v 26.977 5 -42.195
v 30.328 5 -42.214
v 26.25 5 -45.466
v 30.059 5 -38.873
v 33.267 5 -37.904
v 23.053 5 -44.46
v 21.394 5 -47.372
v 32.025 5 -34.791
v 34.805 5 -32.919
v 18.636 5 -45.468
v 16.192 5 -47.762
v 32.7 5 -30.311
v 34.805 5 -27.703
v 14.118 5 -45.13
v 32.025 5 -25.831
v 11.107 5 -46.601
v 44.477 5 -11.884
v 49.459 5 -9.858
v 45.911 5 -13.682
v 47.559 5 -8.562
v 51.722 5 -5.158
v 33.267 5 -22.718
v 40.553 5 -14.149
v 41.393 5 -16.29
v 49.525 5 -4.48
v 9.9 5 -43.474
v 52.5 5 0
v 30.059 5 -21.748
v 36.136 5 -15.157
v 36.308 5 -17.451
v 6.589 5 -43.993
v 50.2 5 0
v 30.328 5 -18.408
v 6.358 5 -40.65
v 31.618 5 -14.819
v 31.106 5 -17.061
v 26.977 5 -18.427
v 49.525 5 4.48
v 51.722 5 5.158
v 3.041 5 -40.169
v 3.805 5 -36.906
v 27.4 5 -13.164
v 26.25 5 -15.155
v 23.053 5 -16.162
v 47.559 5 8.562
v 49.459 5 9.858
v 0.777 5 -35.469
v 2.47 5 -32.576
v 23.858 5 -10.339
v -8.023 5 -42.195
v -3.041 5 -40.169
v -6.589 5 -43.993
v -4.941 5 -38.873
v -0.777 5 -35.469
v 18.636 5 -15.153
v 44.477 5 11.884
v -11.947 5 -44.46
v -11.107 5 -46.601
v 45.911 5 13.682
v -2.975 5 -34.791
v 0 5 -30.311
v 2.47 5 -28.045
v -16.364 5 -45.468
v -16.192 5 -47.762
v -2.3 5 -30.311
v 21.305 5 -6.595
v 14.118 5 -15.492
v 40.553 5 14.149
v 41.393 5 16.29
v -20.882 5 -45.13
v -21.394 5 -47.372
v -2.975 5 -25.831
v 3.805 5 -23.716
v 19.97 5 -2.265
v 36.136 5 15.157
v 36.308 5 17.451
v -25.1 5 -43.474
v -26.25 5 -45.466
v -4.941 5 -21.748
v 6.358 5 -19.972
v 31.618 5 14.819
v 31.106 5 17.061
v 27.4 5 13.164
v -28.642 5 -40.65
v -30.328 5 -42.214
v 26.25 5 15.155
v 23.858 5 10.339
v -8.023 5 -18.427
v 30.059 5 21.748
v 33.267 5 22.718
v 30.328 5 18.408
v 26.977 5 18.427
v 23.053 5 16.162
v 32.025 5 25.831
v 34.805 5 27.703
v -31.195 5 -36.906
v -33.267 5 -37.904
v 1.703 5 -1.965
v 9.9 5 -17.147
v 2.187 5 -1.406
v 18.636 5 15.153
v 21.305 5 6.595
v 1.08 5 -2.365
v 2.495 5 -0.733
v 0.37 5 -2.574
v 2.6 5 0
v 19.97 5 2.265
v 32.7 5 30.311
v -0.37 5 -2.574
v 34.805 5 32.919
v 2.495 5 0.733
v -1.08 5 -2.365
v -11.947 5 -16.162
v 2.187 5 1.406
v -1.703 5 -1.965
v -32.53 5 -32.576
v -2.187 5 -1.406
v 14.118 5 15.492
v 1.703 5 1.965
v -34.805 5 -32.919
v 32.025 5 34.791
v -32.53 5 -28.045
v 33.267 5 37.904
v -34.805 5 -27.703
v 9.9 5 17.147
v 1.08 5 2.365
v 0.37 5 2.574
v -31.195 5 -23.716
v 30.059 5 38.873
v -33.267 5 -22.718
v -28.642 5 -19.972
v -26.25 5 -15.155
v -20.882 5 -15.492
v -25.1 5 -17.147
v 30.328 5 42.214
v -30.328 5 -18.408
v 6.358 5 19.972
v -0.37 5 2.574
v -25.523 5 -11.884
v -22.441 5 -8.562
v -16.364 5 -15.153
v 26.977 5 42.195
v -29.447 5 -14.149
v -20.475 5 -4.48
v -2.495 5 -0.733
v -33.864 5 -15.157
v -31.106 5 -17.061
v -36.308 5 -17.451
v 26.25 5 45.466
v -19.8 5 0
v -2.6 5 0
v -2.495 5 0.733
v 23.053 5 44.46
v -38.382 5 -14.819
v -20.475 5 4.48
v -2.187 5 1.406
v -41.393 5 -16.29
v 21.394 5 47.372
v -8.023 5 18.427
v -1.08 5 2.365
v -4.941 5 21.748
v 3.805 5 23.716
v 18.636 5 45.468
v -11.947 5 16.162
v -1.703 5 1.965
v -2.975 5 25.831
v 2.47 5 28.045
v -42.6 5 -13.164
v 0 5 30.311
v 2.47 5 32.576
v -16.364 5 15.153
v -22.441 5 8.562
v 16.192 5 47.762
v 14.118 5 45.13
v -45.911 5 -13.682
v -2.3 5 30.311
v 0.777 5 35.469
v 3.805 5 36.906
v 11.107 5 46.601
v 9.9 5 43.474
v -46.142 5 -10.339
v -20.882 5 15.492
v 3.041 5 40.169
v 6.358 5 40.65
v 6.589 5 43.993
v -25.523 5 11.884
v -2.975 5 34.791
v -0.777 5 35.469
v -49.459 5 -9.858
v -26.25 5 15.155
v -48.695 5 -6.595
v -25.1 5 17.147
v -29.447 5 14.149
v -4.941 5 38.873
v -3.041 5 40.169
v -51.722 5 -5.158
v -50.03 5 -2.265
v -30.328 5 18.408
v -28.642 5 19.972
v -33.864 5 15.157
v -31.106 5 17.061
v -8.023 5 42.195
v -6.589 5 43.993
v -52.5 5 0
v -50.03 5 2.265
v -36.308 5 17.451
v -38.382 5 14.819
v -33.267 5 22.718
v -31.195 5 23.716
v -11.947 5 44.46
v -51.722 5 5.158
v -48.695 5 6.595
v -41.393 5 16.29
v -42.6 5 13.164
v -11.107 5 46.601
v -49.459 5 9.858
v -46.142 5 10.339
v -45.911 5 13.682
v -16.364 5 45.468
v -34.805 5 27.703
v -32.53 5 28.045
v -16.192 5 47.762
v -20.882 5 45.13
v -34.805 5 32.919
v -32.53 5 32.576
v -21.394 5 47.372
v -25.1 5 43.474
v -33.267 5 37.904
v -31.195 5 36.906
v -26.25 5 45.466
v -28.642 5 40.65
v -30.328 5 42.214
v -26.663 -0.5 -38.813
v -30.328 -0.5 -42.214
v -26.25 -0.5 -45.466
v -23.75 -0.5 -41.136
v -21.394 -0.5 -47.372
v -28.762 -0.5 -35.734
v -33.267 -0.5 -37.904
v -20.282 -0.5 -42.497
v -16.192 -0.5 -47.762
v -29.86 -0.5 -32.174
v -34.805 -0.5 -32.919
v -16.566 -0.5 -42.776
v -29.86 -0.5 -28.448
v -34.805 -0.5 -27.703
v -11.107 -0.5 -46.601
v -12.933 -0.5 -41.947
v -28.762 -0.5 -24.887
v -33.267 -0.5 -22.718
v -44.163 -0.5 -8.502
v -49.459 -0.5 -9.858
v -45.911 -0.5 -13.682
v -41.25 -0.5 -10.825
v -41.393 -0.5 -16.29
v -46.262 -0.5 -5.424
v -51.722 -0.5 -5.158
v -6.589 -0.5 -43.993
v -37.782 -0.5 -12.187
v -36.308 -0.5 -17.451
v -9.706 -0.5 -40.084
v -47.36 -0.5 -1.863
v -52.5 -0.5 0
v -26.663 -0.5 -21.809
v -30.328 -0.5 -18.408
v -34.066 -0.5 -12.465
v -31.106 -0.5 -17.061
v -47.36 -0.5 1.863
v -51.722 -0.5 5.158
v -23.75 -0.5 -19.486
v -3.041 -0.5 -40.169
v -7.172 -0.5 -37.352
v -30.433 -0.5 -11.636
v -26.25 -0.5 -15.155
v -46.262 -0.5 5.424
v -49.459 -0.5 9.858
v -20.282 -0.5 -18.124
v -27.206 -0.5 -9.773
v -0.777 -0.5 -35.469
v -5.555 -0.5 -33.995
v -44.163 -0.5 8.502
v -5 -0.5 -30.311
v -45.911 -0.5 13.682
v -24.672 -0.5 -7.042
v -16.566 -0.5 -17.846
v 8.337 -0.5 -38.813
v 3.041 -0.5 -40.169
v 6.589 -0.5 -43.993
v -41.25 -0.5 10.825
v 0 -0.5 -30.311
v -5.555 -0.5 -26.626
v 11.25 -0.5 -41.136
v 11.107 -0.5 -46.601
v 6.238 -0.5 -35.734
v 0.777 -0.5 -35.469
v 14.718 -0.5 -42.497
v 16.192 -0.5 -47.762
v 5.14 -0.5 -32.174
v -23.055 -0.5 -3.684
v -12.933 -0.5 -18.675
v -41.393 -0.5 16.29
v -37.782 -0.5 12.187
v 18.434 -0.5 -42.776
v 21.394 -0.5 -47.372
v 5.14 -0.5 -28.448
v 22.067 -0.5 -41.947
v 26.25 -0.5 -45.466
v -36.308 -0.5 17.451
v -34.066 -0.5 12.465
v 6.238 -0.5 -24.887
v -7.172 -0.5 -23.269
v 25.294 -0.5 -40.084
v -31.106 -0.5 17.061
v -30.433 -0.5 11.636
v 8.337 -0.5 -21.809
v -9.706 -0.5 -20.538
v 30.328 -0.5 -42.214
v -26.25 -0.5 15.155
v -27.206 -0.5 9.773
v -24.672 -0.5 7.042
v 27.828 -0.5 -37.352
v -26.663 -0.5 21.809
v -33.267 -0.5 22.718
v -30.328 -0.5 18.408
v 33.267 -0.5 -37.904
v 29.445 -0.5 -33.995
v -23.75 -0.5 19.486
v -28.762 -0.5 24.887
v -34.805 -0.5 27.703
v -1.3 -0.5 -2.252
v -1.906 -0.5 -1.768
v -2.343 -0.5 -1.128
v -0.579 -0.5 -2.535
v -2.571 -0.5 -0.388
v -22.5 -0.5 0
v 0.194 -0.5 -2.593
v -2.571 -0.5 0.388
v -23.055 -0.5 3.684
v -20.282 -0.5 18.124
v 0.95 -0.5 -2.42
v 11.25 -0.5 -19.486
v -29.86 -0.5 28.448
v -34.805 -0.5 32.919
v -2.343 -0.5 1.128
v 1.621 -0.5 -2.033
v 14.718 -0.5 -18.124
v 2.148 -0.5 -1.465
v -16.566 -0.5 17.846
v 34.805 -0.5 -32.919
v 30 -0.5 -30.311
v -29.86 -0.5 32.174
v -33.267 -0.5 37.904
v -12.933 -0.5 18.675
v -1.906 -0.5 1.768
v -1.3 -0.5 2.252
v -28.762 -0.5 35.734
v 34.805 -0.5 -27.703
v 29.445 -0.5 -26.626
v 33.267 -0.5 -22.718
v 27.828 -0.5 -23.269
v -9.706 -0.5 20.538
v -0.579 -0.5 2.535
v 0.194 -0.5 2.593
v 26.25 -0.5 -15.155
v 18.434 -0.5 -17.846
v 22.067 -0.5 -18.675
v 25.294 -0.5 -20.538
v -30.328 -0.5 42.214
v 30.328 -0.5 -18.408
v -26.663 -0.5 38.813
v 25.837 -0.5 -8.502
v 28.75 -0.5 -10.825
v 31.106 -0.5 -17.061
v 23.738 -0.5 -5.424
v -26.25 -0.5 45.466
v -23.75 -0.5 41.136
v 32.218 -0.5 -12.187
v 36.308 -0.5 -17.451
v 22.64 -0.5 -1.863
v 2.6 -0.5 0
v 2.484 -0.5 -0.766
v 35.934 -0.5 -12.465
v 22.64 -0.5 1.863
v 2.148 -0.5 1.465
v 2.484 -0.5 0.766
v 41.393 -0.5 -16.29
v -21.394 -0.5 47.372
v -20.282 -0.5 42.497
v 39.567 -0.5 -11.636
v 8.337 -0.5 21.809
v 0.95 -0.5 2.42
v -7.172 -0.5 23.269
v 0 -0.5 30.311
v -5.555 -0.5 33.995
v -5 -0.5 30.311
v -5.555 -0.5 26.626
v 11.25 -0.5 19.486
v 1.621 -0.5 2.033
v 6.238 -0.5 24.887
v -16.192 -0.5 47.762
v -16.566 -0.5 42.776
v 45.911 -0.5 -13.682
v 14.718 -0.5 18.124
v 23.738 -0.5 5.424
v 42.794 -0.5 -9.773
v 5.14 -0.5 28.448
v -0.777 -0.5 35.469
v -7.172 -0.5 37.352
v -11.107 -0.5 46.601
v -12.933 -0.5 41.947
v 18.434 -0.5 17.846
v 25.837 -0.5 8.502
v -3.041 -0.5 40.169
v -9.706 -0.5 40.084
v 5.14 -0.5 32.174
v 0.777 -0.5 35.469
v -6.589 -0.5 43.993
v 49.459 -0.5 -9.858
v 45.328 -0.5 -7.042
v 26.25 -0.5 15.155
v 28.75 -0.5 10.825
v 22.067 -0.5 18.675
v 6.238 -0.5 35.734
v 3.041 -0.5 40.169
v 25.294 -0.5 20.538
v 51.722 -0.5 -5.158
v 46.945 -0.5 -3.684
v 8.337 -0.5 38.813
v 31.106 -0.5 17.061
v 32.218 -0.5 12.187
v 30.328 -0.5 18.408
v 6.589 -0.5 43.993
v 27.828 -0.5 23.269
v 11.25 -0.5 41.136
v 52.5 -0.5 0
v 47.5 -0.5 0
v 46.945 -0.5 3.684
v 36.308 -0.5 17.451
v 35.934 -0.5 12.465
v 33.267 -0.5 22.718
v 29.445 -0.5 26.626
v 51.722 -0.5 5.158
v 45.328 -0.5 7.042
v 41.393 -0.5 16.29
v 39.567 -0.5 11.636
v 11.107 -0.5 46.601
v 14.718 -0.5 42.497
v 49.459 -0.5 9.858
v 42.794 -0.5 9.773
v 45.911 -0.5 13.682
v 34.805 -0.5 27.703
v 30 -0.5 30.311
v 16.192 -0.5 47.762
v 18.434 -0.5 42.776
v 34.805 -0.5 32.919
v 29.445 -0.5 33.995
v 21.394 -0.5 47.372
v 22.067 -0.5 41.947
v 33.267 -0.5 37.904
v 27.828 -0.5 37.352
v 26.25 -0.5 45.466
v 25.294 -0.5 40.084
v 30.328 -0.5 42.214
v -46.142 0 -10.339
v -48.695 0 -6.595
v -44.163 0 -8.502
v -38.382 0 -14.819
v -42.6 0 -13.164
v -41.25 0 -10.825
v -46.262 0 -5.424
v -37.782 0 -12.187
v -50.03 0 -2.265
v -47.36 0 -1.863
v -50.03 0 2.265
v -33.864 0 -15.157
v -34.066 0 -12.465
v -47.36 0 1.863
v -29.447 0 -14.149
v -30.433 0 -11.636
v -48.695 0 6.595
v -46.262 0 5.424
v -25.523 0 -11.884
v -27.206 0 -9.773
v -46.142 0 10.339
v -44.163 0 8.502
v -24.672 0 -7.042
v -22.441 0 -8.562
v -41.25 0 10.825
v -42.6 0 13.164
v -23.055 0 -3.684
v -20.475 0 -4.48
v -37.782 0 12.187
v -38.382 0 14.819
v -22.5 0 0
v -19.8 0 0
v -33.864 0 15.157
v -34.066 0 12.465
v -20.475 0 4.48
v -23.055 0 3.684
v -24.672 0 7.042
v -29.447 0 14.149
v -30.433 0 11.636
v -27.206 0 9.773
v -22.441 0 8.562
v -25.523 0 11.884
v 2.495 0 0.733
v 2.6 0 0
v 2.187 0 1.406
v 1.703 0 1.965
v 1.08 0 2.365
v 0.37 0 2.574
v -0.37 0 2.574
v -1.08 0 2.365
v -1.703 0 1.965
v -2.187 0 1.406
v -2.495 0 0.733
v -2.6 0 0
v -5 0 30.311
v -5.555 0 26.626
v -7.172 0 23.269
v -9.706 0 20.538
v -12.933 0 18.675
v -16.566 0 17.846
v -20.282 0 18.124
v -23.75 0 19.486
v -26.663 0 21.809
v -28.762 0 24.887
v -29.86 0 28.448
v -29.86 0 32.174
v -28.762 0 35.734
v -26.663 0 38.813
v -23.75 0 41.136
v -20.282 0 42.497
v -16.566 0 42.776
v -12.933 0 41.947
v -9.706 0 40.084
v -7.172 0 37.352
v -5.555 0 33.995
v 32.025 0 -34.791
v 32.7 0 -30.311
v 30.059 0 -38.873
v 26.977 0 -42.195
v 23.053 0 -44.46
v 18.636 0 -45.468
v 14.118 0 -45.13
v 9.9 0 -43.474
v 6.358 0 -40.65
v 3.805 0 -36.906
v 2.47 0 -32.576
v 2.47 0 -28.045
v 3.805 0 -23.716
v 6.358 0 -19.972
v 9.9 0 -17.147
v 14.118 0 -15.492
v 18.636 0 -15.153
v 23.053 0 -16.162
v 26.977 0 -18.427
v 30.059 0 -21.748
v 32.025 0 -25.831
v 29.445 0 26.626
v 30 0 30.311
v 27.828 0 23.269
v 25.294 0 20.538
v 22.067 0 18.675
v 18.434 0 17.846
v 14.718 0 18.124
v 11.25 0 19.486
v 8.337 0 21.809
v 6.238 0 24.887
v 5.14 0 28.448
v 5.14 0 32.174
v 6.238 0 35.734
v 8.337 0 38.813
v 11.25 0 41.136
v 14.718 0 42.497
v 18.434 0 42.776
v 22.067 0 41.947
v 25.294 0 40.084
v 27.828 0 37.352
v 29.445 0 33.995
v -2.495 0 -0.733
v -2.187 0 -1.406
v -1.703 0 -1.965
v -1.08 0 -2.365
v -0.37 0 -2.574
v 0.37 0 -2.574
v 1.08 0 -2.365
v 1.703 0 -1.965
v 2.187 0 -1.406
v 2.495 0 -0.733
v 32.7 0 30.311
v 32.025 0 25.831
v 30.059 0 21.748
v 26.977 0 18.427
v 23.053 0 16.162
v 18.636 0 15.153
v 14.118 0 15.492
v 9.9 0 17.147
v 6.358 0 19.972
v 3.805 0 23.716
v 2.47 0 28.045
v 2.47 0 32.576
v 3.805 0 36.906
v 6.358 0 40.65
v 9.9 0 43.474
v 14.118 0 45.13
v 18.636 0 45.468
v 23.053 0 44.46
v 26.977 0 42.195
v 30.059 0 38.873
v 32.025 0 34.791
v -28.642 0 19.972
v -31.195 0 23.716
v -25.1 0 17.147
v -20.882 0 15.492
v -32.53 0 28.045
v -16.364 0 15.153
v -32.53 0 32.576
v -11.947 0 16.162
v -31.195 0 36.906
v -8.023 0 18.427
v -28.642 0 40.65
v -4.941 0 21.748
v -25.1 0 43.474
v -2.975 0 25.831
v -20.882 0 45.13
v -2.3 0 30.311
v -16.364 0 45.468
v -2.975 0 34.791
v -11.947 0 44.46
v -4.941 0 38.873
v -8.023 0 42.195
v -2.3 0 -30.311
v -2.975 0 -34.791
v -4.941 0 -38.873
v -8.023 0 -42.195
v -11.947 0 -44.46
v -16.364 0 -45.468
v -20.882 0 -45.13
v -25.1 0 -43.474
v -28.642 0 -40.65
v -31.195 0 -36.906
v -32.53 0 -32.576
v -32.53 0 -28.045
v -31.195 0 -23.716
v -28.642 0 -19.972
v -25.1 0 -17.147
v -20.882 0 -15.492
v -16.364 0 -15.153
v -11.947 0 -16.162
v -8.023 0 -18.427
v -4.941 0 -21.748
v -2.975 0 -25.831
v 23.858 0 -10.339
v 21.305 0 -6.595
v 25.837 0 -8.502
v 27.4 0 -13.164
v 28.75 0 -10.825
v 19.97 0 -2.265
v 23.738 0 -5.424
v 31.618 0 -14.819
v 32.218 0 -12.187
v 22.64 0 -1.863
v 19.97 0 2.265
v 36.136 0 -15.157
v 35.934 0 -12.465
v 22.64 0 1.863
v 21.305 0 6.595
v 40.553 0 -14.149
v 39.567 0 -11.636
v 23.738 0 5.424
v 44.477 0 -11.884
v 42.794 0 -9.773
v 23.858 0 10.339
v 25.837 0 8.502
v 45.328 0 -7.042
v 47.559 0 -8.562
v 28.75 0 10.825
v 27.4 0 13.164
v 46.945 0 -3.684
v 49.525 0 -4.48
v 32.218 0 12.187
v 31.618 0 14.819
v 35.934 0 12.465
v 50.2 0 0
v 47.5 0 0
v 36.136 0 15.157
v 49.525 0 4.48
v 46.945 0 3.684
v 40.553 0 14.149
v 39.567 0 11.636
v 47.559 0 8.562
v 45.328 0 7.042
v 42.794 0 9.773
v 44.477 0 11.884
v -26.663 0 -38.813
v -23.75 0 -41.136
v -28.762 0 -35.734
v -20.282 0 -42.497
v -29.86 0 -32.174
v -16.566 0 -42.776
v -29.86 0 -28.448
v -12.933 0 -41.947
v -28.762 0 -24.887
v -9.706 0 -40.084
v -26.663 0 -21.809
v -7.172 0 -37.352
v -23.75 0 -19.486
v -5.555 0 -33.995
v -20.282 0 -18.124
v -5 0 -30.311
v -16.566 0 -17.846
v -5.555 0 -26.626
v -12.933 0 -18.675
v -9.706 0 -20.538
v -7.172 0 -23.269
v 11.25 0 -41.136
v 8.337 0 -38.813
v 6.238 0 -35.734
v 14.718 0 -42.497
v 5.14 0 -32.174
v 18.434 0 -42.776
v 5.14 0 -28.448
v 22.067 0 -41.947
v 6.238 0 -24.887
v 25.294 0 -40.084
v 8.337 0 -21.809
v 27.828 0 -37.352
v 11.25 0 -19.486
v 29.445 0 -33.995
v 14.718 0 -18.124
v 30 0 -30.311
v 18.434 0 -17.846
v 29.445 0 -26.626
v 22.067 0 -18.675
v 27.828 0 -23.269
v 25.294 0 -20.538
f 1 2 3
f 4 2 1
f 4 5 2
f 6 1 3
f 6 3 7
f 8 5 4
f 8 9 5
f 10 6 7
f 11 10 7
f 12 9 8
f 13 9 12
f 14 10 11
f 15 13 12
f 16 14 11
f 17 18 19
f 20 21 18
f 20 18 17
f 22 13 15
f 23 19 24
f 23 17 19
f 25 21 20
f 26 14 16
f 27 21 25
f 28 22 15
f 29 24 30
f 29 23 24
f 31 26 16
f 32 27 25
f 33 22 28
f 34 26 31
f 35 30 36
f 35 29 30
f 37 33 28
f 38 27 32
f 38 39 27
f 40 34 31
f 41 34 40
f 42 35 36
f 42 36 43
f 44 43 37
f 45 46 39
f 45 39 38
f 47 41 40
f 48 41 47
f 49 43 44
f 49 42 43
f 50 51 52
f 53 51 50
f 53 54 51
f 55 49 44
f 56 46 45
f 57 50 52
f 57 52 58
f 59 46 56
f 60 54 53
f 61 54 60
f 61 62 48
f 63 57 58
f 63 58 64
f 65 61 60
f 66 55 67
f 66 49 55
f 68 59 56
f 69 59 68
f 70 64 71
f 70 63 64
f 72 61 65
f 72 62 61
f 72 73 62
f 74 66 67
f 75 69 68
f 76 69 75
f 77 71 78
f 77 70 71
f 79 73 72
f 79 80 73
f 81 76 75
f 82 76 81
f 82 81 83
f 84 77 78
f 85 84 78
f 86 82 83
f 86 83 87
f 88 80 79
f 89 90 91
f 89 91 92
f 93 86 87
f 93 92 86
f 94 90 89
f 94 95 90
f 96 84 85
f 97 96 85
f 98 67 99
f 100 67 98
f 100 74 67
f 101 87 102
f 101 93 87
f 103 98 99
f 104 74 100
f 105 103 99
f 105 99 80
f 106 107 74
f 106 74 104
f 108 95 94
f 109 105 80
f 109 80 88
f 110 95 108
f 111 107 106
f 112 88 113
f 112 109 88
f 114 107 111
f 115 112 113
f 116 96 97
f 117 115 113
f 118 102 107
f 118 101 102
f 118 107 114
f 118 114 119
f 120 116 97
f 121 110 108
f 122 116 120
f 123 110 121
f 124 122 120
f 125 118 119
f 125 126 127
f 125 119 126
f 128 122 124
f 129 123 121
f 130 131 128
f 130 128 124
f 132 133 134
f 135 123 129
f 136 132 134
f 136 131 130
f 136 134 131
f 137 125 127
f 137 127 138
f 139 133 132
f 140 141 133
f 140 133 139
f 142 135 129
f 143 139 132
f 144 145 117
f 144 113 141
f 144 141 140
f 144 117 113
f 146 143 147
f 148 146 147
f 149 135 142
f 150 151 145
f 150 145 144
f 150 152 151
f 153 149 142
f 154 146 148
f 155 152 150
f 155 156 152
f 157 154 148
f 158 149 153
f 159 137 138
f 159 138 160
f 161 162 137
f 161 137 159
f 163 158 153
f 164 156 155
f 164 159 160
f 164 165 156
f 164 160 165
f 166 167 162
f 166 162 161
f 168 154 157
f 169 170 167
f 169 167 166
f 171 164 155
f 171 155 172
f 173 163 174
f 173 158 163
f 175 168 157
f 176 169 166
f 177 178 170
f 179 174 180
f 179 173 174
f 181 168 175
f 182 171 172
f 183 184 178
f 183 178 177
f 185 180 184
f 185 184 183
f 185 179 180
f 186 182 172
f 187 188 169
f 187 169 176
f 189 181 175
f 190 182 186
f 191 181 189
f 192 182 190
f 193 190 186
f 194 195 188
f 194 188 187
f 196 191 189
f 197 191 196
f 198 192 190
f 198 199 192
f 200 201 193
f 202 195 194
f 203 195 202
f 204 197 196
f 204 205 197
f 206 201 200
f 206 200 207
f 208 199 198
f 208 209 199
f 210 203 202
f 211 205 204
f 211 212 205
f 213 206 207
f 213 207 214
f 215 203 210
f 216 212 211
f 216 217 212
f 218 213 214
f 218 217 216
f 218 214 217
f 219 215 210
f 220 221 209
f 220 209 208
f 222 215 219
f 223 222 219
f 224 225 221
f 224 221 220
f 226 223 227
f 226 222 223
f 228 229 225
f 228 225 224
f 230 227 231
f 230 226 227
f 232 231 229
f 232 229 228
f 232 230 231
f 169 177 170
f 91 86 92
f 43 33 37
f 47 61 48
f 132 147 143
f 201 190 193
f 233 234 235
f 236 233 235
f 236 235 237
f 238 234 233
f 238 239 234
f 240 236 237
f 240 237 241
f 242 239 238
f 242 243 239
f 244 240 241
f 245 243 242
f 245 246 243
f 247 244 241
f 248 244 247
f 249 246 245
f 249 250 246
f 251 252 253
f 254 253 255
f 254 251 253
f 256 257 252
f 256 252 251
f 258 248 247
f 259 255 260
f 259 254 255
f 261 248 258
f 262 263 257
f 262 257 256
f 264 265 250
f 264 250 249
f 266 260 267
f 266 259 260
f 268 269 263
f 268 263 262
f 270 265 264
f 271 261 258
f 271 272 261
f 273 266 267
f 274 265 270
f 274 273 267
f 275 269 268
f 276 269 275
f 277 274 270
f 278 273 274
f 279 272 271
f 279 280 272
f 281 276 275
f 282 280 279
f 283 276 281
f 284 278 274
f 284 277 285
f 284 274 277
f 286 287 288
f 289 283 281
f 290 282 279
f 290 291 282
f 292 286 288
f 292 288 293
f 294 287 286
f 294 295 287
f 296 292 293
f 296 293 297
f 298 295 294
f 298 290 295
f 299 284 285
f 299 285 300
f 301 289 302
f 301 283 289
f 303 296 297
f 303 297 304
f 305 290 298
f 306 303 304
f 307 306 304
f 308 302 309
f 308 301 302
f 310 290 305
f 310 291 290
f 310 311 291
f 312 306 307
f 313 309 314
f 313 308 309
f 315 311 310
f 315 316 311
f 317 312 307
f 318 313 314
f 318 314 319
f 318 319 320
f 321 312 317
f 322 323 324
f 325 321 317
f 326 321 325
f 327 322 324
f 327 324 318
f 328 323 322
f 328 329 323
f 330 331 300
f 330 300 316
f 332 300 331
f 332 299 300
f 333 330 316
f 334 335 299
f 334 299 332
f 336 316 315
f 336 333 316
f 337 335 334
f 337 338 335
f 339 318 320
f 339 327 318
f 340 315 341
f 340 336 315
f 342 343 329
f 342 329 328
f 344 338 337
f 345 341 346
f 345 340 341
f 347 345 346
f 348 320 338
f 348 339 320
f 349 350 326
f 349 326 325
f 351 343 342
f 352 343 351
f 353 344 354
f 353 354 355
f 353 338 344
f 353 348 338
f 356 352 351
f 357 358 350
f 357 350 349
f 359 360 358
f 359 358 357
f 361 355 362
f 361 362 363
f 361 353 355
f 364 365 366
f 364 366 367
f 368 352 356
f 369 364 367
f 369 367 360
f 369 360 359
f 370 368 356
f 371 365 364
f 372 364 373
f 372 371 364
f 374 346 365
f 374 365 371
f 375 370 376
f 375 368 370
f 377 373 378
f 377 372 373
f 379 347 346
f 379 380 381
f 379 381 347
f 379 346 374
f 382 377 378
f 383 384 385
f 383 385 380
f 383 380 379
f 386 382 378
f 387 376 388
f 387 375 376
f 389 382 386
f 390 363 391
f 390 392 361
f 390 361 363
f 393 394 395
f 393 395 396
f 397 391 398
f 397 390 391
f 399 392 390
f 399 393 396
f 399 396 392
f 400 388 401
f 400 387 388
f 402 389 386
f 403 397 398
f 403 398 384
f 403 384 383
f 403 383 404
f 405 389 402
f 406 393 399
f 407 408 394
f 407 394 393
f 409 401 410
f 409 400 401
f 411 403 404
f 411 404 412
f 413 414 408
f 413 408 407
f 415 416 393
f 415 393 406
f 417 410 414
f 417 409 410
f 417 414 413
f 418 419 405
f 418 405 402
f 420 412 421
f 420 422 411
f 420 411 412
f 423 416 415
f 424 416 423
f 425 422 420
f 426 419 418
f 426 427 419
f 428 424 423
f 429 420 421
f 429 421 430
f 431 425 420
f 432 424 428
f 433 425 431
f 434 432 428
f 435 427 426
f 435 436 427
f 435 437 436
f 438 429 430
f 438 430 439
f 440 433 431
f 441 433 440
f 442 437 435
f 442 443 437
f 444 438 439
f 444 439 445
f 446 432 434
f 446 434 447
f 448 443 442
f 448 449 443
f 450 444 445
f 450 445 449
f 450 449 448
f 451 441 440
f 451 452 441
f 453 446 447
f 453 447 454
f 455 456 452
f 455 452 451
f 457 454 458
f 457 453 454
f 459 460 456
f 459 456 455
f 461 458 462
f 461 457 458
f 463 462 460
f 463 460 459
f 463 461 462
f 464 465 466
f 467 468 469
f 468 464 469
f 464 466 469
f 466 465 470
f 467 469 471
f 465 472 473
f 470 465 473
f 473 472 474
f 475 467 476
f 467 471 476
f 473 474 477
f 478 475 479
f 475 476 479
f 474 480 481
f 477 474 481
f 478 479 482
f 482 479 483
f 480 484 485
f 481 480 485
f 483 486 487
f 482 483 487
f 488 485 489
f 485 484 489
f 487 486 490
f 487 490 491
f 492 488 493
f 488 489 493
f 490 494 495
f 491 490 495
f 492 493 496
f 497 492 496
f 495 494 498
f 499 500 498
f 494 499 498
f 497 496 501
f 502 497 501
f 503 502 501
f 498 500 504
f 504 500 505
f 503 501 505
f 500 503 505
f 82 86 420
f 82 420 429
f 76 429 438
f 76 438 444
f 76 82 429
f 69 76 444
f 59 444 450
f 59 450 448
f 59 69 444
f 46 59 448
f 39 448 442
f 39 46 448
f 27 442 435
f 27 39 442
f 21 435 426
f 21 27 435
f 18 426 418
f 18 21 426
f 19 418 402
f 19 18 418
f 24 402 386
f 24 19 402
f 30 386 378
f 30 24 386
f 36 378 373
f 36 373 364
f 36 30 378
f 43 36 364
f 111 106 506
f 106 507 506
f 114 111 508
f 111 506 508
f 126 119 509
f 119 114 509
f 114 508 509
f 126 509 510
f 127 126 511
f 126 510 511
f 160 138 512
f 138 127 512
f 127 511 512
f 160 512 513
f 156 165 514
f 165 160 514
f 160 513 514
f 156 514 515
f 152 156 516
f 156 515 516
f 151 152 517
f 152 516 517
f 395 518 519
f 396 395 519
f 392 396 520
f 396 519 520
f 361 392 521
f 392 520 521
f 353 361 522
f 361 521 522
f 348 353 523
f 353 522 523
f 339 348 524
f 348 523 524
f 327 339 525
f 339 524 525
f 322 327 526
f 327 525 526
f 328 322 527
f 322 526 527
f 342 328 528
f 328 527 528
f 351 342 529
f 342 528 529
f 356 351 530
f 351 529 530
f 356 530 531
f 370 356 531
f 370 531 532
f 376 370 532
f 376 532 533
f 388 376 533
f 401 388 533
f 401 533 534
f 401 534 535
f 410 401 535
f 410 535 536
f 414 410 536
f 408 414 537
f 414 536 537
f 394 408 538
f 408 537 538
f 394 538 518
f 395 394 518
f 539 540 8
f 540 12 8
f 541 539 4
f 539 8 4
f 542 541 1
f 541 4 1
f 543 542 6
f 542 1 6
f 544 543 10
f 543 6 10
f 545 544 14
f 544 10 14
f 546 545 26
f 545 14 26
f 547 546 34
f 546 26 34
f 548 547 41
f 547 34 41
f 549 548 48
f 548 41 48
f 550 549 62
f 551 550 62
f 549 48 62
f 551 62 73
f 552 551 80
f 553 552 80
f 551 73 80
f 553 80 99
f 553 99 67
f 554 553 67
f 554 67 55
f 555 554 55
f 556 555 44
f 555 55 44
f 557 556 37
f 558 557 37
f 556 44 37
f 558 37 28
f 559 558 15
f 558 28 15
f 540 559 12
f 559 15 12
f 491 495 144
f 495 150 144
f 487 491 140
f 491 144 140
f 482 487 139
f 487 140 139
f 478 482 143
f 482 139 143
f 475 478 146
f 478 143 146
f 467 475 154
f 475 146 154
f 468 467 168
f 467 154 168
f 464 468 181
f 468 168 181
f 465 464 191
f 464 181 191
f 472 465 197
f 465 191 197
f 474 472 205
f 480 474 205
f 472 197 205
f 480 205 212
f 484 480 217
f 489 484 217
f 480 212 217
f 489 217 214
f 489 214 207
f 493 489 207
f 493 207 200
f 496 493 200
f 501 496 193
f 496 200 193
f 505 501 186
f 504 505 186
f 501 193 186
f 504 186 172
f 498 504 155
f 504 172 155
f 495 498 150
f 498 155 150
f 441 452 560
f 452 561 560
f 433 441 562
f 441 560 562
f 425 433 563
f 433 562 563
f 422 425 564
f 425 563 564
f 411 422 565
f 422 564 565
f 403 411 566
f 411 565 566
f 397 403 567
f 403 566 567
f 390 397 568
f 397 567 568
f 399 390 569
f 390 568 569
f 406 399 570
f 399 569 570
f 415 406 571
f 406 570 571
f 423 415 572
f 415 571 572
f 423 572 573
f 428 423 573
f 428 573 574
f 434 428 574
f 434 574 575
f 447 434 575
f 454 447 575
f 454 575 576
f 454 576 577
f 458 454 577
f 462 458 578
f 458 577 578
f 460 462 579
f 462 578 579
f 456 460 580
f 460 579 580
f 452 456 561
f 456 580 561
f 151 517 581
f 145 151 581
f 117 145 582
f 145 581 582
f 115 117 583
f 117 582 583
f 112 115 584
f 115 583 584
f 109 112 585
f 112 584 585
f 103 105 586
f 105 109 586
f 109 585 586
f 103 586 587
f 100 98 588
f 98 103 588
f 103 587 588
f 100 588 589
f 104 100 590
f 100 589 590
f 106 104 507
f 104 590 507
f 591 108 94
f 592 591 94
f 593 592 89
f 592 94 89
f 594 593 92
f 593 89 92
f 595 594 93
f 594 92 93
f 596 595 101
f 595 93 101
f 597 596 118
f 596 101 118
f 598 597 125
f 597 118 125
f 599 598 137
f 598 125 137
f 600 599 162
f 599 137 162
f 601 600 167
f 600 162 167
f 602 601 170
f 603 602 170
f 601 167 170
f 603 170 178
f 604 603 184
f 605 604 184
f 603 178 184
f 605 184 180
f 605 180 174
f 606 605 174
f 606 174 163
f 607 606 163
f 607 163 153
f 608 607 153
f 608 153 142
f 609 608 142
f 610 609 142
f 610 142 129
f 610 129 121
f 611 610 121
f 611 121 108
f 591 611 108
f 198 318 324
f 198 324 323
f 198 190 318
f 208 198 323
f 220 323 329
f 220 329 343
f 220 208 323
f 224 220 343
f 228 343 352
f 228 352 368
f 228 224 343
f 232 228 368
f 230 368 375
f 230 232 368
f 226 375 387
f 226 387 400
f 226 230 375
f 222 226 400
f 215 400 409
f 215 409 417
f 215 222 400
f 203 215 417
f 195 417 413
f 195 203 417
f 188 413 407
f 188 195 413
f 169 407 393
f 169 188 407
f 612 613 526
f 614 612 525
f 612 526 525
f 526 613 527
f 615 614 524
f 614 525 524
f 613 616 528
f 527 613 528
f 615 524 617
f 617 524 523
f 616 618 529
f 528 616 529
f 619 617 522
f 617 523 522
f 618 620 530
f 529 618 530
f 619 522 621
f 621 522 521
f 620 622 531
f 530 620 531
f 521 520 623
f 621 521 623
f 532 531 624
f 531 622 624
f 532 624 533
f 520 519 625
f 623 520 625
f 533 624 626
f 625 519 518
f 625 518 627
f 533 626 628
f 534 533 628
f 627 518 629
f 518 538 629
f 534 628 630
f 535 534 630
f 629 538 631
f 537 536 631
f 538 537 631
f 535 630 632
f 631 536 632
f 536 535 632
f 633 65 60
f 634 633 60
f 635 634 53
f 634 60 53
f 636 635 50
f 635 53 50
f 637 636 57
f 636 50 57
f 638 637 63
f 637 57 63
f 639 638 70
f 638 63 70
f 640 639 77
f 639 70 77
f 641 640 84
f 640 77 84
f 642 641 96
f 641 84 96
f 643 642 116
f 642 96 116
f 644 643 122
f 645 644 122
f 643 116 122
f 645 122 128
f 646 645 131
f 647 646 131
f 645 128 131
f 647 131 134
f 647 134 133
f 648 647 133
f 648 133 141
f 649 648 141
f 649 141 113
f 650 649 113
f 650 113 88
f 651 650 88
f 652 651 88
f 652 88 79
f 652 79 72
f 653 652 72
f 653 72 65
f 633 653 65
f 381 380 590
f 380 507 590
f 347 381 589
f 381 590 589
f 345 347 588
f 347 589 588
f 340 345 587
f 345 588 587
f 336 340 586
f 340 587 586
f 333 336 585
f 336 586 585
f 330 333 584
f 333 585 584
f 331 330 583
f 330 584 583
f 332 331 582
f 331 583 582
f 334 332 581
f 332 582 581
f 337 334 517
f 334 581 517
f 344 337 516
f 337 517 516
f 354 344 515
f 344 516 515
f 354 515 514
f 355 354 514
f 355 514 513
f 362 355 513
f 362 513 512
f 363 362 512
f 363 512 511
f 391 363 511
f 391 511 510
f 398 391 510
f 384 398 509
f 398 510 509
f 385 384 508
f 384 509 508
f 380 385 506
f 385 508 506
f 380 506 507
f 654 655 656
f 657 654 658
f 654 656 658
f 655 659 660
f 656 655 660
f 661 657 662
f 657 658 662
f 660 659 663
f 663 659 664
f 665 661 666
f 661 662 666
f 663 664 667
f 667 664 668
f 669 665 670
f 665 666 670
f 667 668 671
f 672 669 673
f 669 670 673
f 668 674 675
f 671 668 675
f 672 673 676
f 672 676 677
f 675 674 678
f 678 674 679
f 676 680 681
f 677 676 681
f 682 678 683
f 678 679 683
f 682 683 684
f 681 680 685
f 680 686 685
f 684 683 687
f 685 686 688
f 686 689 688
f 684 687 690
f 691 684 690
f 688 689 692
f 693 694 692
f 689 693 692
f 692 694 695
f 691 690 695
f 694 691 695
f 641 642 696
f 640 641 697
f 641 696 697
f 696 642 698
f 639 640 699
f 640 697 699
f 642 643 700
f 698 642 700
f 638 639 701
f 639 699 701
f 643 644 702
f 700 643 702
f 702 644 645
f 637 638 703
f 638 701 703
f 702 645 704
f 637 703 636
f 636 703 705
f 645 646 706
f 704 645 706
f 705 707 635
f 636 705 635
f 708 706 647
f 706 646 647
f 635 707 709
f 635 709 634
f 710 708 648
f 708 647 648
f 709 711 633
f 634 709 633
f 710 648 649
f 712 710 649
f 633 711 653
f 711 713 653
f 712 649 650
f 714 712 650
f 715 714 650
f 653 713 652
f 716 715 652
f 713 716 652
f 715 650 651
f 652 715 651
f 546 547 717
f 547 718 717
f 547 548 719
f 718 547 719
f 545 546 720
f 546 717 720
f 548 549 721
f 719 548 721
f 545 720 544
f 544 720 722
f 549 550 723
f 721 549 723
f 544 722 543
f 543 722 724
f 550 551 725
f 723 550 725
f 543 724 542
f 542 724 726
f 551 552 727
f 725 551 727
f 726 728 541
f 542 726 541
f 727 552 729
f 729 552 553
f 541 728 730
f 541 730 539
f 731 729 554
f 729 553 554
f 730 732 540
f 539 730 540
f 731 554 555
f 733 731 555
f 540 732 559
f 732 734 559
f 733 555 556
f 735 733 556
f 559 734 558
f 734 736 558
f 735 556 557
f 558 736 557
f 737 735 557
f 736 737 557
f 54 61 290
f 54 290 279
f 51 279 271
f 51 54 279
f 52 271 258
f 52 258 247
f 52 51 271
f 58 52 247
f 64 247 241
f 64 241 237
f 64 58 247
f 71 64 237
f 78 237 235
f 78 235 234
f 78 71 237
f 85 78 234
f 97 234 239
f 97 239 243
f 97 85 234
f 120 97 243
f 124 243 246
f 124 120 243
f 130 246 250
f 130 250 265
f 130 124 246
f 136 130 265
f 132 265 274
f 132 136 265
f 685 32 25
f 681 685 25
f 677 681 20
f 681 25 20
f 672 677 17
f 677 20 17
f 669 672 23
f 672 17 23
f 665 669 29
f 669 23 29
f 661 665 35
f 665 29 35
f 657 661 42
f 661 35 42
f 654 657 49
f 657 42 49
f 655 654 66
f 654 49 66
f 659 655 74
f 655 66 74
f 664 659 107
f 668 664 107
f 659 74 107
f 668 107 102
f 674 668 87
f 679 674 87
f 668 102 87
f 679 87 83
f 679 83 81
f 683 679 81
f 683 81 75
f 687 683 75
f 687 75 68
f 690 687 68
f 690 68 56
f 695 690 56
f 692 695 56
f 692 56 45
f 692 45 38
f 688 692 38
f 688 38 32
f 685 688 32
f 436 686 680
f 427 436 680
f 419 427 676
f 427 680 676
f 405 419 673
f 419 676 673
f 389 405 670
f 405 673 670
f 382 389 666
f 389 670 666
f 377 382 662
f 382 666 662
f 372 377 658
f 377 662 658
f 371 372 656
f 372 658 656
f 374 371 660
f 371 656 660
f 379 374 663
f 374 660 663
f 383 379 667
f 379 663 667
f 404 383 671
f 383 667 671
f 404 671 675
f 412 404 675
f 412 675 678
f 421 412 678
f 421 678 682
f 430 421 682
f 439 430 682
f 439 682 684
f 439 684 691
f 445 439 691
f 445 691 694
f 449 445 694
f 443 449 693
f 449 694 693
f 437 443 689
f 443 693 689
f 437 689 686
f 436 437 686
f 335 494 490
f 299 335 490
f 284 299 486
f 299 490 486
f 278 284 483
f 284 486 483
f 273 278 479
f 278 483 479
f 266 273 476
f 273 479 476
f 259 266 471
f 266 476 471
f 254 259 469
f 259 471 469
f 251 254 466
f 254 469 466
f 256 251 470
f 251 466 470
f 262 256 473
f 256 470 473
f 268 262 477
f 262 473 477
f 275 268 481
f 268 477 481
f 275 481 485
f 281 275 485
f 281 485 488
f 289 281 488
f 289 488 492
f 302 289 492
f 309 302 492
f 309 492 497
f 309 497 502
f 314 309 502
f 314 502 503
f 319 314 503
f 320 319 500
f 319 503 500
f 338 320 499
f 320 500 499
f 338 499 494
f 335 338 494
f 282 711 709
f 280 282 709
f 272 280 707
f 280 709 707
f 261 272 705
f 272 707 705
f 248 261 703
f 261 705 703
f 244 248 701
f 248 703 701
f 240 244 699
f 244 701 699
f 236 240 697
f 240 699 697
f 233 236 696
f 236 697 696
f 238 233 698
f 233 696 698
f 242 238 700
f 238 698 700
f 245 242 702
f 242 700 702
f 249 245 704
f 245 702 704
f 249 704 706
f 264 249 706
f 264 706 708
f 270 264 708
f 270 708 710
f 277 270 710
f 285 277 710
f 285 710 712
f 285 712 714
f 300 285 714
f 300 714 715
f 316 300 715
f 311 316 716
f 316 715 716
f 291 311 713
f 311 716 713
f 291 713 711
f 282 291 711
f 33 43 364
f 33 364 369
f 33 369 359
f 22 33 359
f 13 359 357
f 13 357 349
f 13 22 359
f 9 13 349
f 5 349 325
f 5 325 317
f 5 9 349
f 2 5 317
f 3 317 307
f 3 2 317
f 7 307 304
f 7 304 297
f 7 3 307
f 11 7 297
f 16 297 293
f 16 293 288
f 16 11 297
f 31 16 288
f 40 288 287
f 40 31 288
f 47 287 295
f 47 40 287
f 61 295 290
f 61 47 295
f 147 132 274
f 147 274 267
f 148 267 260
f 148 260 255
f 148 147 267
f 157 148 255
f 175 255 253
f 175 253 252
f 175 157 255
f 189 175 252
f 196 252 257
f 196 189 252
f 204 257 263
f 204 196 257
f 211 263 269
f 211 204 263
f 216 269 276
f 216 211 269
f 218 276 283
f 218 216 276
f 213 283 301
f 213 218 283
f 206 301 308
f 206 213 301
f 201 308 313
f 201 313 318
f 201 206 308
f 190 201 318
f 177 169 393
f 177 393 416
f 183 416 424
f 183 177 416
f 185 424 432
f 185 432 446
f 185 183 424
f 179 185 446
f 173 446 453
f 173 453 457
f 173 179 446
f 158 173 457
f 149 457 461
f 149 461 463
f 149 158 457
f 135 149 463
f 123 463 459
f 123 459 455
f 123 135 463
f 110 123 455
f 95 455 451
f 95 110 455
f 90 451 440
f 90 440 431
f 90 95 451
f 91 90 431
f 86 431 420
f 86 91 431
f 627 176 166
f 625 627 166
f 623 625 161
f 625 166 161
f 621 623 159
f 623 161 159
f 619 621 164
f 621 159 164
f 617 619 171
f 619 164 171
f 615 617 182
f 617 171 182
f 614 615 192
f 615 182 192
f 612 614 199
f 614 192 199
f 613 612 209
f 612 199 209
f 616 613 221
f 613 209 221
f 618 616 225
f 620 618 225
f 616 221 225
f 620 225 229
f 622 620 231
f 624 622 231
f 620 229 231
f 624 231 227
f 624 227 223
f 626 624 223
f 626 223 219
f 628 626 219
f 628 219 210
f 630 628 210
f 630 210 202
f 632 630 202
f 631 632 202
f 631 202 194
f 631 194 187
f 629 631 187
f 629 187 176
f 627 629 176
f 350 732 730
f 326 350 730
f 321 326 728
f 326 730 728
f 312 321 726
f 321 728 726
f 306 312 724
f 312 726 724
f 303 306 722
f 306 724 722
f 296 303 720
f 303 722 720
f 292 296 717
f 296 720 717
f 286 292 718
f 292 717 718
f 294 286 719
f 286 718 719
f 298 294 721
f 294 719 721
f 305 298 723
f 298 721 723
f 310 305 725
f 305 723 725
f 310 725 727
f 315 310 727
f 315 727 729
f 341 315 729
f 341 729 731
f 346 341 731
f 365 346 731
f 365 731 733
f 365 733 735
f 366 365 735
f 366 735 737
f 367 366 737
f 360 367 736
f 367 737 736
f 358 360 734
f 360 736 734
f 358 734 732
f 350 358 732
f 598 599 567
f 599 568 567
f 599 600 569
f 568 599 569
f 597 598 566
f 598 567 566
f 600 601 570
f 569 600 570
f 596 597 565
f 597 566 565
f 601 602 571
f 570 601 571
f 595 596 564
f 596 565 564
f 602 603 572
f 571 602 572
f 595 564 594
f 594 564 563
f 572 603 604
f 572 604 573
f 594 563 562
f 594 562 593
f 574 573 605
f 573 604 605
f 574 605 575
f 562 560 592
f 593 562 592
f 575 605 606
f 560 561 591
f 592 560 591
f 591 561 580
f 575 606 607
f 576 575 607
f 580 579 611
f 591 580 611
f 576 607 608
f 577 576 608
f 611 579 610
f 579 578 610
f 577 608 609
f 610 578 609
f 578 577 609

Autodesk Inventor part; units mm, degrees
ref_plane "YZ Plane" through (0, 0, 0) normal (1, 0, 0) x (0, 1, 0)
ref_plane "XZ Plane" through (0, 0, 0) normal (0, 1, 0) x (-1, 0, 0)
ref_plane "XY Plane" through (0, 0, 0) normal (0, 0, 1) x (1, 0, 0)
sketch "Sketch1" plane through (0, 0, 0) normal (0, 1, 0) x (-1, 0, 0)
  circle A0 centre (0, 0) radius 55
  circle A1 centre (0, 0) radius 2.6
  dimension "d0" = 110
  dimension "d1" = 5.2
extrude "Extrusion1" add sketch "Sketch1" along normal blind 5
sketch "Sketch2" plane through (0, 5, 0) normal (0, 1, 0) x (1, 0, 0)
  point P0 (0, 0)
sketch "Sketch4" plane through (0, 5, 0) normal (0, 1, 0) x (1, 0, 0)
  circle A0 centre (0, 0) radius 21.9076
  circle A1 centre (0, 0) radius 35
  circle A2 centre (-35, 0) radius 15.2
  circle A3 centre (-17.5, -30.3109) radius 15.2
  circle A4 centre (17.5, -30.3109) radius 15.2
  circle A5 centre (35, 0) radius 15.2
  circle A6 centre (17.5, 30.3109) radius 15.2
  circle A7 centre (-17.5, 30.3109) radius 15.2
  circle A8 centre (-21.9076, 0) radius 5.15
  circle A9 centre (-15.491, -15.491) radius 5.15
  circle A10 centre (0, -21.9076) radius 5.15
  circle A11 centre (15.491, -15.491) radius 5.15
  circle A12 centre (21.9076, 0) radius 5.15
  circle A13 centre (15.491, 15.491) radius 5.15
  circle A14 centre (0, 21.9076) radius 5.15
  circle A15 centre (-15.491, 15.491) radius 5.15
  dimension "d13" = 70
  dimension "d8" = 30.4
  dimension "d11" = 360
  dimension "d14" = 10.3
  dimension "d17" = 360
extrude "Extrusion3" cut sketch "Sketch4" against normal blind 5 contours A0 A12 A5 | A0 A12 | A12 A5 A0 | A0 A5 A1 A12 | A0 A5 A12 | A5 A1 | A6 A13 A0 | A0 A13 A6 | A6 A0 A13 | A13 A0 A6 A14 A1 | A1 A6 | A4 A11 A0 | A0 A11 A4 | A4 A1 A10 A0 A11 | A11 A0 A4 | A4 A1 | A6 A14 | A7 A14 A0 A15 A1 | A1 A7 | A10 A4 | A3 A1 | A1 A3 A9 A0 A10 | A7 A14 | A10 A3 | A7 A15 A0 | A2 A0 A8 A1 | A1 A2 | A15 A0 A7 | A0 A9 A3 | A3 A0 A9 | A15 A7 A0 | A2 A8 A0 | A0 A3 A9 | A0 A8 A2 | A8 A2 A0 | A0 A8 picked at (11.9722, 17.0625) picked at (16.7139, 17.1312) picked at (8.2786, 19.0961) picked at (16.7139, -17.1312) picked at (11.9722, -17.0625) picked at (8.2786, -19.0961) picked at (-8.2786, 19.0961) picked at (-16.7226, 17.1255) picked at (-8.2786, -19.0961) picked at (-16.7226, -17.1255) picked at (-11.9722, 17.0625) picked at (-11.9722, -17.0625)
sketch "Sketch5" plane through (0, 5, 0) normal (0, 1, 0) x (1, 0, 0)
  point P0 (0, 0)
sketch "Sketch6" plane through (0, 0, 0) normal (0, -1, 0) x (1, 0, 0)
  circle A0 centre (0, 0) radius 55
extrude "Extrusion4" add sketch "Sketch6" along normal blind 0.5
sketch "Sketch7" plane through (0, 5, 0) normal (0, 1, 0) x (1, 0, 0)
  circle A0 centre (-35, 0) radius 15.2 projected
  circle A1 centre (-35, 0) radius 12.5
  circle A2 centre (-17.5, -30.3109) radius 15.2 projected
  circle A3 centre (-17.5, -30.3109) radius 12.5
  circle A4 centre (17.5, -30.3109) radius 15.2 projected
  circle A5 centre (17.5, -30.3109) radius 12.5
  circle A6 centre (35, 0) radius 15.2 projected
  circle A7 centre (35, 0) radius 12.5
  circle A8 centre (17.5, 30.3109) radius 15.2 projected
  circle A9 centre (17.5, 30.3109) radius 12.5
  circle A10 centre (-17.5, 30.3109) radius 15.2 projected
  circle A11 centre (-17.5, 30.3109) radius 12.5
  point P0 (0, 0)
  dimension "d23" = 25
  dimension "d24" = 25
  dimension "d25" = 25
  dimension "d26" = 25
  dimension "d27" = 25
  dimension "d28" = 25
extrude "Extrusion5" cut sketch "Sketch7" against normal blind 86.25 contours A1 | A3 | A5 | A7 | A9 | A11
sketch "Sketch8" plane through (0, 5, 0) normal (0, 1, 0) x (1, 0, 0)
  circle A0 centre (0, 0) radius 2.6
extrude "Extrusion6" cut sketch "Sketch8" against normal blind 86.25
sketch "Sketch9" plane through (0, 5, 0) normal (0, 1, 0) x (1, 0, 0)
  circle A0 centre (17.5, 30.3109) radius 15.2 projected
  arc A1 (26.25, 15.1554) -> (0, 30.3109) centre (17.5, 30.3109) ccw
  circle A2 centre (35, 0) radius 15.2 projected
  arc A3 (26.25, -15.1554) -> (26.25, 15.1554) centre (35, 0) ccw
  circle A4 centre (17.5, -30.3109) radius 15.2 projected
  arc A5 (0, -30.3109) -> (26.25, -15.1554) centre (17.5, -30.3109) ccw
  circle A6 centre (-17.5, -30.3109) radius 15.2 projected
  arc A7 (-26.25, -15.1554) -> (0, -30.3109) centre (-17.5, -30.3109) ccw
  circle A8 centre (-35, 0) radius 15.2 projected
  arc A9 (-26.25, 15.1554) -> (-26.25, -15.1554) centre (-35, 0) ccw
  circle A10 centre (-17.5, 30.3109) radius 15.2 projected
  arc A11 (0, 30.3109) -> (-26.25, 15.1554) centre (-17.5, 30.3109) ccw
  circle A12 centre (0, 0) radius 2.6 projected
  circle A13 centre (0, 0) radius 65.8368
  dimension "d33" = 35
  dimension "d34" = 35
  dimension "d35" = 35
  dimension "d36" = 35
  dimension "d37" = 35
  dimension "d38" = 35
  dimension "d39" = 131.6736
extrude "Extrusion7" cut sketch "Sketch9" against normal blind 86.25 contours A13
properties part number "generator 12smaller"
